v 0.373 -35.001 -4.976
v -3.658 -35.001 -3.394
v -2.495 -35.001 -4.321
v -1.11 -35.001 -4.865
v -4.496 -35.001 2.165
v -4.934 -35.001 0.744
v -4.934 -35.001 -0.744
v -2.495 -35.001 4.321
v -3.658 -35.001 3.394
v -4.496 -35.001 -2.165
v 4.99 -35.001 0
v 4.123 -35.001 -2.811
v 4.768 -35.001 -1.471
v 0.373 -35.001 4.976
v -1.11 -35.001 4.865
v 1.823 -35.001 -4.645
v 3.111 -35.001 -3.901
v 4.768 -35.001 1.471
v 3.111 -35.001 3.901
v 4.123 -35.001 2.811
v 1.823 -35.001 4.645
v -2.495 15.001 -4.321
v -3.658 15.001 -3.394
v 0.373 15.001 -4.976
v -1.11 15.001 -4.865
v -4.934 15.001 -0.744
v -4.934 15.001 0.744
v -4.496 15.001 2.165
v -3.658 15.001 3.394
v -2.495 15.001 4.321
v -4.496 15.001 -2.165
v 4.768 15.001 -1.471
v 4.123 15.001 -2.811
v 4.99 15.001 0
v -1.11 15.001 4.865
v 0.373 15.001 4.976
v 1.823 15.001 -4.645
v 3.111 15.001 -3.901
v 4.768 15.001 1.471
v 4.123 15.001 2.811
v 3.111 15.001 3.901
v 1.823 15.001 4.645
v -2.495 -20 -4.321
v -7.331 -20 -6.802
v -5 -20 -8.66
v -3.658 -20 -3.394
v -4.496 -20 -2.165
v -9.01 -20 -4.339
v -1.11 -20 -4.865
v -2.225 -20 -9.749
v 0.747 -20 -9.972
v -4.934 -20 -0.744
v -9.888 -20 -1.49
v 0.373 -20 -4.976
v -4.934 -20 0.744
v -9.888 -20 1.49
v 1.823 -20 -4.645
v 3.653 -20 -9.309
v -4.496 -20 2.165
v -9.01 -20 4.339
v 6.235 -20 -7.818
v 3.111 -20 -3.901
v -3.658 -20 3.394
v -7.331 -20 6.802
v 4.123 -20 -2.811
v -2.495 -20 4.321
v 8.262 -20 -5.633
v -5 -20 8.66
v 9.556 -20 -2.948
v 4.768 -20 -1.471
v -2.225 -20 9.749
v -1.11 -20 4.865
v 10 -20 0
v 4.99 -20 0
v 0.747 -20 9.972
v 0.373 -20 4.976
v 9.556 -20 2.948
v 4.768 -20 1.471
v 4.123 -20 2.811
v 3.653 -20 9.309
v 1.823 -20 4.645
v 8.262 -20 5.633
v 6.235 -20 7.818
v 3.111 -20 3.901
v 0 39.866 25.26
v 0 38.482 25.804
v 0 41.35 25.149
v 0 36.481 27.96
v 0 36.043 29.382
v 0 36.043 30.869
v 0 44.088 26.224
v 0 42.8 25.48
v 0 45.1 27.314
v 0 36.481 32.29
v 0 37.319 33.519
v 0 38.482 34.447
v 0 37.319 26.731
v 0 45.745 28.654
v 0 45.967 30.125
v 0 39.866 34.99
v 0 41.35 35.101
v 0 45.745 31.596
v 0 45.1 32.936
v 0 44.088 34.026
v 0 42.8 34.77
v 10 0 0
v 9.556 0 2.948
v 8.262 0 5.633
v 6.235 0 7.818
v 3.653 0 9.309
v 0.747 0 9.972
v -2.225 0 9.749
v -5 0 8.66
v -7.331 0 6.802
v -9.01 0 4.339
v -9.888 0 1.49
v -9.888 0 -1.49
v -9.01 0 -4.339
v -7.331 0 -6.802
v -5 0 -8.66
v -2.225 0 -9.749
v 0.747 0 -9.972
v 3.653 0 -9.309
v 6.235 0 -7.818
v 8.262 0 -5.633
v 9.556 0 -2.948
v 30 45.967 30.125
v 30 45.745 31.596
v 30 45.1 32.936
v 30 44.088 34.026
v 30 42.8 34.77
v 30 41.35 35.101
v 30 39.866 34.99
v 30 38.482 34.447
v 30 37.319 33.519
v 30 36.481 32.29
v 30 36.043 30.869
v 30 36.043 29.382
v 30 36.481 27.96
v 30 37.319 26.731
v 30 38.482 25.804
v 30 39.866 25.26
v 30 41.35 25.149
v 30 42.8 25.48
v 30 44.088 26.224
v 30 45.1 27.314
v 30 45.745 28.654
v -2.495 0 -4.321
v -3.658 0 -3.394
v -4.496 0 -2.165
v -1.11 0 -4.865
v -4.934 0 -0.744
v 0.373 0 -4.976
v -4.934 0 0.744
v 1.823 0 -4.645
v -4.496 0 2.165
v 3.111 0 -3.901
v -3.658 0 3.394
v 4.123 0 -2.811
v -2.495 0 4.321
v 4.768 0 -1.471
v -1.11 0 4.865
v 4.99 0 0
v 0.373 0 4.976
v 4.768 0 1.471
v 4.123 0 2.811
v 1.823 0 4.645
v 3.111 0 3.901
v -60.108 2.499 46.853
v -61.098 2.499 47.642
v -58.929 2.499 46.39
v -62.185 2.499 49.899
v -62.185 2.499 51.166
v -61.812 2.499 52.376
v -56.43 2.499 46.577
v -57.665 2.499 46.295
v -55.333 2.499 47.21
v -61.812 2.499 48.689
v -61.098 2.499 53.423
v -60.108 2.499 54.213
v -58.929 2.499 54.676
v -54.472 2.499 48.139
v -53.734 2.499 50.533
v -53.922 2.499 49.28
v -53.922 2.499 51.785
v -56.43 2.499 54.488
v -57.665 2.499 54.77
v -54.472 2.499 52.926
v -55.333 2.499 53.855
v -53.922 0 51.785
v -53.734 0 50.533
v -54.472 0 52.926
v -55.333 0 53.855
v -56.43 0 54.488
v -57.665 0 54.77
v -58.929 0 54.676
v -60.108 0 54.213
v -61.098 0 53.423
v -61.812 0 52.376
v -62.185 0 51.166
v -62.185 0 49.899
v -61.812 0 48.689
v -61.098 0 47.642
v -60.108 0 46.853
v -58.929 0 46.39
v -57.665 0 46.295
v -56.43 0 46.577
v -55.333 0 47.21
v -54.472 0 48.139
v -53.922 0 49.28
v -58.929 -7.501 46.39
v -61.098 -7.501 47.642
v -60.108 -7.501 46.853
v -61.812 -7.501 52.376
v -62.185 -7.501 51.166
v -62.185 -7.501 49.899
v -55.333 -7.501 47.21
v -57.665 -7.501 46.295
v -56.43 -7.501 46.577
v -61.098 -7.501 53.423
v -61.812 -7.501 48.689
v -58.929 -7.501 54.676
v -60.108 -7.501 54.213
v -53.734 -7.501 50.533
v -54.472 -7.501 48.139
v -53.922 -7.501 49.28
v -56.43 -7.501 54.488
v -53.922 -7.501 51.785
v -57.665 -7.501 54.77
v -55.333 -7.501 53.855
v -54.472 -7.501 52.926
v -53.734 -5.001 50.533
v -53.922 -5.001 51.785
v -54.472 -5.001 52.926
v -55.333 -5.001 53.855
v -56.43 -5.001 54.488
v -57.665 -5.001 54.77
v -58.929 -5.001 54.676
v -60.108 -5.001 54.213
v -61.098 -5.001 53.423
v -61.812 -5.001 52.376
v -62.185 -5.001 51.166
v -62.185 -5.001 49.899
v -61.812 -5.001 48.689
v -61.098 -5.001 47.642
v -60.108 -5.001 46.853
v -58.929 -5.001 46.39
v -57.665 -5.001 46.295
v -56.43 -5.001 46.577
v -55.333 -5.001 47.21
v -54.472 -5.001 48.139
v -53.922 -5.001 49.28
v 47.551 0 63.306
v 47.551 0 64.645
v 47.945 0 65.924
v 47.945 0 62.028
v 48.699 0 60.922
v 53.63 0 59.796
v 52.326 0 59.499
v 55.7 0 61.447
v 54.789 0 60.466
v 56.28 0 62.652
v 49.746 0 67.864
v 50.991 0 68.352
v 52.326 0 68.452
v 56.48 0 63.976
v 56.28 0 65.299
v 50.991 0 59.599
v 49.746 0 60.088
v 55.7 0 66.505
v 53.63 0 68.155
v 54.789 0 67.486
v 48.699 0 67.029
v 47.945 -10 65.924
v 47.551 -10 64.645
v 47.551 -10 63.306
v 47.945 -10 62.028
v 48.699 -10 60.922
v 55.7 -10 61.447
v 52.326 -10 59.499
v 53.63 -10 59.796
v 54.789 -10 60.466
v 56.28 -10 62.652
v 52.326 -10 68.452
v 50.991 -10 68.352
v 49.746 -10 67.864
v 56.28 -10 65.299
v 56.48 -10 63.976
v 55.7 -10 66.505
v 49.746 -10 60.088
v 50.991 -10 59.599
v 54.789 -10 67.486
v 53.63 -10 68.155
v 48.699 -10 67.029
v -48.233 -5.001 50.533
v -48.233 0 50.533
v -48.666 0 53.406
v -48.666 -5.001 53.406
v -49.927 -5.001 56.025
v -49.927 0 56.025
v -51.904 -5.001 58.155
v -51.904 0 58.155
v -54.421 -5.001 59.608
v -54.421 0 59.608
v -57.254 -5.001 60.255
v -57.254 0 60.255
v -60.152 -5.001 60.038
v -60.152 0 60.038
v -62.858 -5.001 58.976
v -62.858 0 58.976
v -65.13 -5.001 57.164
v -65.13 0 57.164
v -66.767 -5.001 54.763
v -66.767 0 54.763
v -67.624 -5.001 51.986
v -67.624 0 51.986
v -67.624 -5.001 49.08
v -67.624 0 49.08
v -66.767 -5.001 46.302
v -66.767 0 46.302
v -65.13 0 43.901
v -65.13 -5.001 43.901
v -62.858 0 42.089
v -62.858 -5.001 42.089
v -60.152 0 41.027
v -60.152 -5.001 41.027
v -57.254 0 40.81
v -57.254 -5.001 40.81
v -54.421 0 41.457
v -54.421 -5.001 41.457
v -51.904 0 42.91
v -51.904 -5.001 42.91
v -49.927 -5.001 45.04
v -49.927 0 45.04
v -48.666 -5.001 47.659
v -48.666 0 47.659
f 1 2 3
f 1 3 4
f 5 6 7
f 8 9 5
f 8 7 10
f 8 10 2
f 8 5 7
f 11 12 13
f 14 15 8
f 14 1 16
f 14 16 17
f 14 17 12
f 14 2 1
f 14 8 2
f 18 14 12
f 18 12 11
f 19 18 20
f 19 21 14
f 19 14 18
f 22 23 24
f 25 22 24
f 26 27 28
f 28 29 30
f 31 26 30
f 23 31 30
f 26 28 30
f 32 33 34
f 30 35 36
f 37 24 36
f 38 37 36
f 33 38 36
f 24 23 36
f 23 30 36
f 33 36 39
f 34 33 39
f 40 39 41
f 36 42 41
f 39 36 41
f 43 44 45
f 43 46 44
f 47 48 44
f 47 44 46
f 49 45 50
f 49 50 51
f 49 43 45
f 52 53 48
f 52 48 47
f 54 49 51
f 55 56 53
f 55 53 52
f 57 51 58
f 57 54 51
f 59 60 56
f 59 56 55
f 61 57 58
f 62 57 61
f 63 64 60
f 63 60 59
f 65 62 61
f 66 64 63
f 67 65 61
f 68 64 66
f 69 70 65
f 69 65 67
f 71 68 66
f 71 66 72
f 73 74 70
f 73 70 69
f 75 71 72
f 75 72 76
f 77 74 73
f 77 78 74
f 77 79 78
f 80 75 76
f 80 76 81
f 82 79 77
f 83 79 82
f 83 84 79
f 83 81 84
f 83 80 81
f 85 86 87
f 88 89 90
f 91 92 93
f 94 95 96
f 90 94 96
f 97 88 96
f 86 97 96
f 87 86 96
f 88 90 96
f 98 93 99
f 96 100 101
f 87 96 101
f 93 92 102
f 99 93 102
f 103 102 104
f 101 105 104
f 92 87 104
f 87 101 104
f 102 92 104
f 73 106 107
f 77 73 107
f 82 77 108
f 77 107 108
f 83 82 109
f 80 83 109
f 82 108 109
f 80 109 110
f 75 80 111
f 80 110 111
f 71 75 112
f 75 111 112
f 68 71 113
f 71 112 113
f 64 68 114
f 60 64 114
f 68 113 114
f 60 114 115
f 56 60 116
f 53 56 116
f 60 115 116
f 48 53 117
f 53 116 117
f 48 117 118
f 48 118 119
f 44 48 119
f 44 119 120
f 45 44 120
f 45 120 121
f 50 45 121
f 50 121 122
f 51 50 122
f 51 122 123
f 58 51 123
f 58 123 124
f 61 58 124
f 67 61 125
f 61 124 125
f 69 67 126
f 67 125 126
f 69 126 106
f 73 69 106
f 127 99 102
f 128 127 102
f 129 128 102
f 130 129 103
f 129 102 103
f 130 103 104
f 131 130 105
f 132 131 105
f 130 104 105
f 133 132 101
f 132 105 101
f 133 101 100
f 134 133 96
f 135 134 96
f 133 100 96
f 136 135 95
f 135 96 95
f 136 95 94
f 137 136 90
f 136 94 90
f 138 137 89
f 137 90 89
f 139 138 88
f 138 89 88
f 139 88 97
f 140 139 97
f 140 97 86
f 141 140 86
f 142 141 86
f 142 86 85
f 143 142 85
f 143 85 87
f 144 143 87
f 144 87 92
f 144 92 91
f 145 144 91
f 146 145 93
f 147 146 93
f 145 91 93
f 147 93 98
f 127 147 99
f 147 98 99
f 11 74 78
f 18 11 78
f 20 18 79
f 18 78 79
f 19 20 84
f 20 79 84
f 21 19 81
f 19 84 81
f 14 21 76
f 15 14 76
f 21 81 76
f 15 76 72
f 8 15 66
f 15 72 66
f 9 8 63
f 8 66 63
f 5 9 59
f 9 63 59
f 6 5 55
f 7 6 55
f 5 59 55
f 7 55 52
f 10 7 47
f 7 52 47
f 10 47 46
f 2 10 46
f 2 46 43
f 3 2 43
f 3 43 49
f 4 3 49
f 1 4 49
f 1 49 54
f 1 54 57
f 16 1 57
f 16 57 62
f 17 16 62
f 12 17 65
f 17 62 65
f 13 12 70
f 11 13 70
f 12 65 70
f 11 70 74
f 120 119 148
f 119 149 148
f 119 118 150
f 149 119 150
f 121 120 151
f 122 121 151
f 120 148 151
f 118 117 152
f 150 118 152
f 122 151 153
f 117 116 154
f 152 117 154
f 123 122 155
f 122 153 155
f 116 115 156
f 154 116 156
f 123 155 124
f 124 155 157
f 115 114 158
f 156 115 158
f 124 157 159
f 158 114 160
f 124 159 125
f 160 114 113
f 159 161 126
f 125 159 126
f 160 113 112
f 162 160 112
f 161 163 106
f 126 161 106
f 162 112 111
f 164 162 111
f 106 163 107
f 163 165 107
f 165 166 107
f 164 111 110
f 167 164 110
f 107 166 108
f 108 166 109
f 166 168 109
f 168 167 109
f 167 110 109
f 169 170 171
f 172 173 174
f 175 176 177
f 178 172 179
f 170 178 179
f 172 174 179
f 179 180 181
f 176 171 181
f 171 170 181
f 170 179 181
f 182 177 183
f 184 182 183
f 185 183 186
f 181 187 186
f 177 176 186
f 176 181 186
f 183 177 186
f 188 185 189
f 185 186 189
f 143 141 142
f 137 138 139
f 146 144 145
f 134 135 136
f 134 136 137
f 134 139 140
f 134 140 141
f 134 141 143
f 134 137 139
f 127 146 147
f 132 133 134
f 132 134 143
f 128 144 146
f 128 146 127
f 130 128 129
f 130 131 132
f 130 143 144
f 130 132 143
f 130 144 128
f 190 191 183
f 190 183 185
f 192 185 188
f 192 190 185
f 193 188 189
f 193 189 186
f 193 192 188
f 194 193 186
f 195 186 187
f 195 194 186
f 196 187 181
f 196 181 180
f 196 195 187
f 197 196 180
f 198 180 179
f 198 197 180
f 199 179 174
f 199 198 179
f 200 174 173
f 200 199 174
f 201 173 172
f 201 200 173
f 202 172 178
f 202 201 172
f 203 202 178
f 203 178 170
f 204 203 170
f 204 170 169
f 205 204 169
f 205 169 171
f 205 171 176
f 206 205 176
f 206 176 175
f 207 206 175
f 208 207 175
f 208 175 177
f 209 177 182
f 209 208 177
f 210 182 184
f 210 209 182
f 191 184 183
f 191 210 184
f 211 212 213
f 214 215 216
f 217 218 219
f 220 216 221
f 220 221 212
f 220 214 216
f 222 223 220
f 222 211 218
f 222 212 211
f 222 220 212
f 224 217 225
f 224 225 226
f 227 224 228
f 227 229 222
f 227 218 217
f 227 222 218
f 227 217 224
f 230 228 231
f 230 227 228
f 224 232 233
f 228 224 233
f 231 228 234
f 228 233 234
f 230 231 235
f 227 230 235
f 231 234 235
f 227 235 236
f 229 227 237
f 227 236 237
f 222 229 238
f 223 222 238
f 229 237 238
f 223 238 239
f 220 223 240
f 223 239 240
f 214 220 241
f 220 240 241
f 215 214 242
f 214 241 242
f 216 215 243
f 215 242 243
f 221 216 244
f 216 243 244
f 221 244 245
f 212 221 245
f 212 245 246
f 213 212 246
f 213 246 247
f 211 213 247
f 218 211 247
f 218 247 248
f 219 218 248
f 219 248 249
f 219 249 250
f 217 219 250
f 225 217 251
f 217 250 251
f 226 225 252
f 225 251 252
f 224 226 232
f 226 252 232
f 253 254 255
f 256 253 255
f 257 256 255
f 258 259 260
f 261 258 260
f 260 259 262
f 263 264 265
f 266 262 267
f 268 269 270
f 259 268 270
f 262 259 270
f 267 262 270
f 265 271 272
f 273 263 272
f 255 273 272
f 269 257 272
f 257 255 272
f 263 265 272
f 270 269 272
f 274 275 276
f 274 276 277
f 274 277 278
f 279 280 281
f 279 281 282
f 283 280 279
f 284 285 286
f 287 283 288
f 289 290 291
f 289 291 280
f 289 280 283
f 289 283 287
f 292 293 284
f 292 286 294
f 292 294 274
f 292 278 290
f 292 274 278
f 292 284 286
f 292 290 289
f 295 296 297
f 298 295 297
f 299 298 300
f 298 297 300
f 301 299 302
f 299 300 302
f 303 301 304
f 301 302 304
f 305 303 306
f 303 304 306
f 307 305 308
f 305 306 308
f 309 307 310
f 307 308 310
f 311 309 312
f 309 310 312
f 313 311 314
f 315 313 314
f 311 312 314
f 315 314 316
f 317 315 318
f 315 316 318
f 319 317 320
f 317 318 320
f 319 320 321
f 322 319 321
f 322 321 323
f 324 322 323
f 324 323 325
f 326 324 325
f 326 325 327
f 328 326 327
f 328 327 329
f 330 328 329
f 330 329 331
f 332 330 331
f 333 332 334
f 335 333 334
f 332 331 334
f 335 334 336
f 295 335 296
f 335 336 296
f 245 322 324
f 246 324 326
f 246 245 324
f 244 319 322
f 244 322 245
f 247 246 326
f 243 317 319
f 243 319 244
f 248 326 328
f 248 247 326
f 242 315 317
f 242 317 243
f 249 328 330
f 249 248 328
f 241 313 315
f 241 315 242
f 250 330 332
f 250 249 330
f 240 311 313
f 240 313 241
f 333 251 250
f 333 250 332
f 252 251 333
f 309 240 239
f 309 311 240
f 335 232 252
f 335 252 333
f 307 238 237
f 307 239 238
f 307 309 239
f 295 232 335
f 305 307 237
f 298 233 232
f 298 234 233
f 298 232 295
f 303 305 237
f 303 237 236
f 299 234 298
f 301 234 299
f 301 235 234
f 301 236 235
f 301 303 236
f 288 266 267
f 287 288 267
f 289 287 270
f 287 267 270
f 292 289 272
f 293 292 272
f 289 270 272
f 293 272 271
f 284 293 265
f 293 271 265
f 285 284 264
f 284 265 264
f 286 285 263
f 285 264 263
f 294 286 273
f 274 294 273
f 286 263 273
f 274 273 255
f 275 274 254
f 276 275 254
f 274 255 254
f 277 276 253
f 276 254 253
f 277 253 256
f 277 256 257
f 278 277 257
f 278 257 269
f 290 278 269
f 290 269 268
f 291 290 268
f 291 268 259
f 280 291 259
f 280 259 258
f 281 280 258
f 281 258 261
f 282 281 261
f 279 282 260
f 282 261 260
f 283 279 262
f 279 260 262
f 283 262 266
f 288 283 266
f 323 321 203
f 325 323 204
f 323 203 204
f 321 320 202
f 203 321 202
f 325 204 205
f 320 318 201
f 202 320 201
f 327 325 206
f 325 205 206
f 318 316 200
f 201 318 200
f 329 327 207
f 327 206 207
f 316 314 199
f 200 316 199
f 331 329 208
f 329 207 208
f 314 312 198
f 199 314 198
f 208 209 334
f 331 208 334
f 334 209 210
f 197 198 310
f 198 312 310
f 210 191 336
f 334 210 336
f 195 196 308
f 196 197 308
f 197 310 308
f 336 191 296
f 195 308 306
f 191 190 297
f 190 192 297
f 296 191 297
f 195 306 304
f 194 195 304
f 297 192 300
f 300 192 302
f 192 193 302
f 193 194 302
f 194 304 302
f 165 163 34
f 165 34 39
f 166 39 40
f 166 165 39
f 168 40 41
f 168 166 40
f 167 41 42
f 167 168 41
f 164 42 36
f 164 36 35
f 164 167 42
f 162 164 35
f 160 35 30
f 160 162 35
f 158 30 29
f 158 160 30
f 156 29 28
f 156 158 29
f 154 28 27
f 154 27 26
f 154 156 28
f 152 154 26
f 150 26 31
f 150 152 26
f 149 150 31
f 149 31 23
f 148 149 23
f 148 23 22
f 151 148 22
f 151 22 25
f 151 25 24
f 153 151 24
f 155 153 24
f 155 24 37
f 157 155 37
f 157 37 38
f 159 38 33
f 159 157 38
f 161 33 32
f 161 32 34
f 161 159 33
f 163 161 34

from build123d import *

# Parameters (mm, degrees)
F0_R      = 9.99998
F0_R_2    = 4.98983
F1_DEPTH  = 19.99996
F2_DEPTH  = 15.00124
F3_R      = 4.98983
F4_DEPTH  = 15.00124
F0_R_3    = 4.48945
F5_DEPTH  = 9.99998
F0_R_4    = 9.74979
F0_R_5    = 4.24942
F6_DEPTH  = 5.00126
F7_DEPTH  = 2.49936
F8_R      = 4.24942
F9_DEPTH  = 2.49936
F10_R     = 4.98983
F11_DEPTH = 29.99994


with BuildPart() as f1:
    # F0 (on Front) → F1 (new body)
    with BuildSketch(Plane.XZ):
        Circle(F0_R)
        Circle(F0_R_2, mode=Mode.SUBTRACT)
        Circle(F0_R_2)
    extrude(amount=F1_DEPTH)

    # F0 (on Front) → F2 (join)
    with BuildSketch(Plane.XZ):
        Circle(F0_R_2)
    extrude(amount=-F2_DEPTH)

    # F3 (on face) → F4 (join)
    with BuildSketch(Plane.XZ.offset(19.99996)):
        Circle(F3_R)
    extrude(amount=F4_DEPTH)


with BuildPart() as f5:
    # F0 (on Front) → F5 (new body)
    with BuildSketch(Plane.XZ):
        with Locations((51.9903, 63.975602)):
            Circle(F0_R_3)
    extrude(amount=F5_DEPTH)


with BuildPart() as f6:
    # F0 (on Front) → F6 (new body)
    with BuildSketch(Plane.XZ):
        with Locations((-57.982963, 50.532632)):
            Circle(F0_R_4)
        with Locations((-57.982963, 50.532632)):
            Circle(F0_R_5, mode=Mode.SUBTRACT)
        with Locations((-57.982963, 50.532632)):
            Circle(F0_R_5)
    extrude(amount=F6_DEPTH)

    # F0 (on Front) → F7 (join)
    with BuildSketch(Plane.XZ):
        with Locations((-57.982963, 50.532632)):
            Circle(F0_R_5)
    extrude(amount=-F7_DEPTH)

    # F8 (on face) → F9 (join)
    with BuildSketch(Plane.XZ.offset(5.00126)):
        with Locations((-57.982963, 50.532632)):
            Circle(F8_R)
    extrude(amount=F9_DEPTH)


with BuildPart() as f11:
    # F10 (on Right) → F11 (new body)
    with BuildSketch(Plane.YZ):
        with Locations((40.976781, 30.125223)):
            Circle(F10_R)
    extrude(amount=F11_DEPTH)


solid = Compound([f1.part, f5.part, f6.part, f11.part])
